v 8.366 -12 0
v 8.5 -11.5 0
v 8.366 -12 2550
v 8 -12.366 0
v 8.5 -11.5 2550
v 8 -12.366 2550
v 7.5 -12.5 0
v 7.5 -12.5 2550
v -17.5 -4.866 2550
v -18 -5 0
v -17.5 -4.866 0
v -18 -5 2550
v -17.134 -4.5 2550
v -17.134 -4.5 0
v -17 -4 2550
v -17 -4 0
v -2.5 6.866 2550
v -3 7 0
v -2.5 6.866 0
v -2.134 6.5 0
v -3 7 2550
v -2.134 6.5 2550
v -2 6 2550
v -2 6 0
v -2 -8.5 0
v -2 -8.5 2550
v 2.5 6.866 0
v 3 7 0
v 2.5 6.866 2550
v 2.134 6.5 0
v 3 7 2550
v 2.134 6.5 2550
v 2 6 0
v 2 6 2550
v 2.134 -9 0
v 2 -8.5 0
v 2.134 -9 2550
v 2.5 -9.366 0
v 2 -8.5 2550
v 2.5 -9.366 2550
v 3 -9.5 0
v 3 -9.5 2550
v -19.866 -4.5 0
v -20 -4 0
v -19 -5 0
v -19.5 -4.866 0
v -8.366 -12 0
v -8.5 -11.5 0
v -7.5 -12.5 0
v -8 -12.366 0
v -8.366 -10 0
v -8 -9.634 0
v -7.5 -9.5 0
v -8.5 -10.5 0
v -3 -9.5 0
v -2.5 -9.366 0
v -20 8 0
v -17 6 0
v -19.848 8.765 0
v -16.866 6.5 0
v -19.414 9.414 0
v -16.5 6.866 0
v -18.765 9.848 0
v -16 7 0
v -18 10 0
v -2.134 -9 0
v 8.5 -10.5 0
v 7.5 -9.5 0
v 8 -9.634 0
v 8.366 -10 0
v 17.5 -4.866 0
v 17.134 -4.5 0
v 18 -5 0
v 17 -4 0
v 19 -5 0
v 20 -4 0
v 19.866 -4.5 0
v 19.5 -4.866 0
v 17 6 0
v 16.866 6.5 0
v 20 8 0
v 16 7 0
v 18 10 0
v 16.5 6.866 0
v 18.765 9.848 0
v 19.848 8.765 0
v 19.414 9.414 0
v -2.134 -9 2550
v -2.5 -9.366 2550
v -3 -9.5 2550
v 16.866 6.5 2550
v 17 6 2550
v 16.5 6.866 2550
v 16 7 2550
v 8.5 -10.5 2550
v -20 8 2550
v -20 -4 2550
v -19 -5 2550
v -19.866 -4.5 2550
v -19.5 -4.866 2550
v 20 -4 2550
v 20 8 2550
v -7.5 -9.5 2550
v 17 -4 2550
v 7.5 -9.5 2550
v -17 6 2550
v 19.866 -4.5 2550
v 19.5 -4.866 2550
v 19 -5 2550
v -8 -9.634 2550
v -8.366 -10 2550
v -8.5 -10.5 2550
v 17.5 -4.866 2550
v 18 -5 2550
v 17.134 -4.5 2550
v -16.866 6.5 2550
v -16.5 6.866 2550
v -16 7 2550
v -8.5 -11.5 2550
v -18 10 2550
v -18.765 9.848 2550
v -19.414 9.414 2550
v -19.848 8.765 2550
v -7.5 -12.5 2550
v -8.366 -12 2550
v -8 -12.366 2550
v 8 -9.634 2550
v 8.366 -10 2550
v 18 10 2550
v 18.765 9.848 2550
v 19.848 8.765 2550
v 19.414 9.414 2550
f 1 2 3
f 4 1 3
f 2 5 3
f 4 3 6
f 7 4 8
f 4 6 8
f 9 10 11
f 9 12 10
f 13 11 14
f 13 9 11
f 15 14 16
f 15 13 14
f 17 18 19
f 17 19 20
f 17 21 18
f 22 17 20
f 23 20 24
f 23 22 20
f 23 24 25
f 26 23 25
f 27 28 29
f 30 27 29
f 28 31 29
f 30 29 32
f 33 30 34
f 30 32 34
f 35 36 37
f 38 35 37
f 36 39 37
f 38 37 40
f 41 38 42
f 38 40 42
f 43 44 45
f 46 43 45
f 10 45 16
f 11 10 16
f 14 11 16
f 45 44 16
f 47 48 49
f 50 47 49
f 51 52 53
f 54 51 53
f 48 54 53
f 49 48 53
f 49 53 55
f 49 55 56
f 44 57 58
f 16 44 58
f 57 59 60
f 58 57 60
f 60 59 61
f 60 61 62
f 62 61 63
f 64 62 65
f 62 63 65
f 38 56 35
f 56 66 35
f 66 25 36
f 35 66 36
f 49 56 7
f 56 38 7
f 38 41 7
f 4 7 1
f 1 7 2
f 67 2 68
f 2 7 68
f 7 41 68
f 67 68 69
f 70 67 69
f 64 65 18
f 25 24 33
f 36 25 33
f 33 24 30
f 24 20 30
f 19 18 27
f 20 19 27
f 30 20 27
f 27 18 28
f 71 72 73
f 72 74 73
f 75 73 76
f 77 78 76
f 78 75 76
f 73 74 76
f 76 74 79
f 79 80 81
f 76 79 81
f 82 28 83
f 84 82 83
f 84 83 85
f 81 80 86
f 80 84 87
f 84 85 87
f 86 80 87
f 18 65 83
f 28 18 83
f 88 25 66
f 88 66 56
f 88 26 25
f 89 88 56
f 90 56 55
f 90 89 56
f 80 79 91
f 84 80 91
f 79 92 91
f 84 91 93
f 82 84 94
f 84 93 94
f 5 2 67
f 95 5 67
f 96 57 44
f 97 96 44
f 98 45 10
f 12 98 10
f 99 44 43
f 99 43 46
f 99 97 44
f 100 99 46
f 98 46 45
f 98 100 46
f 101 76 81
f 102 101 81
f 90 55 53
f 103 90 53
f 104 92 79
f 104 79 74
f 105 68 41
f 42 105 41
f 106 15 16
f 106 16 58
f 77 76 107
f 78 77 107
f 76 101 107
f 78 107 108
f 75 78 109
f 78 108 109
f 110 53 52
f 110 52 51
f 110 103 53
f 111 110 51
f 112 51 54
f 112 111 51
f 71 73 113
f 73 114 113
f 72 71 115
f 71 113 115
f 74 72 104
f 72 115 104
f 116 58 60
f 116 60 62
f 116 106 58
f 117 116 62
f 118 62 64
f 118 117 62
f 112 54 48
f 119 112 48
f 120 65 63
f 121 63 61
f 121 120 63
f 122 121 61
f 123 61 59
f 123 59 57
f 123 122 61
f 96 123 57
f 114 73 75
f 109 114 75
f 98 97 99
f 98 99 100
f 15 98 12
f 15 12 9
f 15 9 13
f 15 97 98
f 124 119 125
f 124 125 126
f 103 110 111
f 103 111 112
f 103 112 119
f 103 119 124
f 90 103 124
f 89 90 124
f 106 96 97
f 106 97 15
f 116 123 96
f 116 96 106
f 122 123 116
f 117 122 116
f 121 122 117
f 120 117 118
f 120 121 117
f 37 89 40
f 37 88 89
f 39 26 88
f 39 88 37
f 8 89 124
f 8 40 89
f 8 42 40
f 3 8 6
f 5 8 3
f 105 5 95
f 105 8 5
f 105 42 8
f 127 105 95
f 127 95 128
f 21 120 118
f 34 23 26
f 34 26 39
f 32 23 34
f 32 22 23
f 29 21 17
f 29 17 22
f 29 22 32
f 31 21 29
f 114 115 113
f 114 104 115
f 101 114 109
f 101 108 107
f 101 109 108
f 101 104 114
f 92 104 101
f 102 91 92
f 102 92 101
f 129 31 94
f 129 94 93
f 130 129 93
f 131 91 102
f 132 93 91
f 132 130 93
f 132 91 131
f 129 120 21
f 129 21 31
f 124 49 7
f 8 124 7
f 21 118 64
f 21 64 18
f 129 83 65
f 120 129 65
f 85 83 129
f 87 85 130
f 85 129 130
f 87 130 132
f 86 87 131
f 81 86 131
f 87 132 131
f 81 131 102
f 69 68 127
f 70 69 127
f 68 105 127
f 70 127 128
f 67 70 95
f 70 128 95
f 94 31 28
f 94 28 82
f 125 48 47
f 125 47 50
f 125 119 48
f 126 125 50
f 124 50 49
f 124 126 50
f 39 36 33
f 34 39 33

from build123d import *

# Parameters (mm, degrees)
F1_DEPTH = 2550
F2_R     = 2
F3_R     = 1


with BuildPart() as f1:
    # F0 (on Top) → F1 (new body)
    with BuildSketch(Plane.XY):
        Polygon((20, 10), (-20, 10), (-20, -5), (-17, -5), (-17, 7), (-2, 7), (-2, -9.5), (-8.5, -9.5), (-8.5, -12.5), (0, -12.5), (8.5, -12.5), (8.5, -9.5), (2, -9.5), (2, 7), (17, 7), (17, -5), (20, -5), align=None)
    extrude(amount=F1_DEPTH)

    # F2
    f2_edges = [f1.edges().sort_by_distance(p)[0] for p in [
        (-20, 10, 1275),
        (20, 10, 1275),
    ]]
    fillet(f2_edges, radius=F2_R)

    # F3
    f3_edges = [f1.edges().sort_by_distance(p)[0] for p in [
        (-20, -5, 1275),
        (-17, -5, 1275),
        (-17, 7, 1275),
        (2, 7, 1275),
        (17, -5, 1275),
        (20, -5, 1275),
        (8.5, -12.5, 1275),
        (8.5, -9.5, 1275),
        (-8.5, -12.5, 1275),
        (-8.5, -9.5, 1275),
        (-2, 7, 1275),
        (17, 7, 1275),
        (2, -9.5, 1275),
        (-2, -9.5, 1275),
    ]]
    fillet(f3_edges, radius=F3_R)


solid = f1.part
